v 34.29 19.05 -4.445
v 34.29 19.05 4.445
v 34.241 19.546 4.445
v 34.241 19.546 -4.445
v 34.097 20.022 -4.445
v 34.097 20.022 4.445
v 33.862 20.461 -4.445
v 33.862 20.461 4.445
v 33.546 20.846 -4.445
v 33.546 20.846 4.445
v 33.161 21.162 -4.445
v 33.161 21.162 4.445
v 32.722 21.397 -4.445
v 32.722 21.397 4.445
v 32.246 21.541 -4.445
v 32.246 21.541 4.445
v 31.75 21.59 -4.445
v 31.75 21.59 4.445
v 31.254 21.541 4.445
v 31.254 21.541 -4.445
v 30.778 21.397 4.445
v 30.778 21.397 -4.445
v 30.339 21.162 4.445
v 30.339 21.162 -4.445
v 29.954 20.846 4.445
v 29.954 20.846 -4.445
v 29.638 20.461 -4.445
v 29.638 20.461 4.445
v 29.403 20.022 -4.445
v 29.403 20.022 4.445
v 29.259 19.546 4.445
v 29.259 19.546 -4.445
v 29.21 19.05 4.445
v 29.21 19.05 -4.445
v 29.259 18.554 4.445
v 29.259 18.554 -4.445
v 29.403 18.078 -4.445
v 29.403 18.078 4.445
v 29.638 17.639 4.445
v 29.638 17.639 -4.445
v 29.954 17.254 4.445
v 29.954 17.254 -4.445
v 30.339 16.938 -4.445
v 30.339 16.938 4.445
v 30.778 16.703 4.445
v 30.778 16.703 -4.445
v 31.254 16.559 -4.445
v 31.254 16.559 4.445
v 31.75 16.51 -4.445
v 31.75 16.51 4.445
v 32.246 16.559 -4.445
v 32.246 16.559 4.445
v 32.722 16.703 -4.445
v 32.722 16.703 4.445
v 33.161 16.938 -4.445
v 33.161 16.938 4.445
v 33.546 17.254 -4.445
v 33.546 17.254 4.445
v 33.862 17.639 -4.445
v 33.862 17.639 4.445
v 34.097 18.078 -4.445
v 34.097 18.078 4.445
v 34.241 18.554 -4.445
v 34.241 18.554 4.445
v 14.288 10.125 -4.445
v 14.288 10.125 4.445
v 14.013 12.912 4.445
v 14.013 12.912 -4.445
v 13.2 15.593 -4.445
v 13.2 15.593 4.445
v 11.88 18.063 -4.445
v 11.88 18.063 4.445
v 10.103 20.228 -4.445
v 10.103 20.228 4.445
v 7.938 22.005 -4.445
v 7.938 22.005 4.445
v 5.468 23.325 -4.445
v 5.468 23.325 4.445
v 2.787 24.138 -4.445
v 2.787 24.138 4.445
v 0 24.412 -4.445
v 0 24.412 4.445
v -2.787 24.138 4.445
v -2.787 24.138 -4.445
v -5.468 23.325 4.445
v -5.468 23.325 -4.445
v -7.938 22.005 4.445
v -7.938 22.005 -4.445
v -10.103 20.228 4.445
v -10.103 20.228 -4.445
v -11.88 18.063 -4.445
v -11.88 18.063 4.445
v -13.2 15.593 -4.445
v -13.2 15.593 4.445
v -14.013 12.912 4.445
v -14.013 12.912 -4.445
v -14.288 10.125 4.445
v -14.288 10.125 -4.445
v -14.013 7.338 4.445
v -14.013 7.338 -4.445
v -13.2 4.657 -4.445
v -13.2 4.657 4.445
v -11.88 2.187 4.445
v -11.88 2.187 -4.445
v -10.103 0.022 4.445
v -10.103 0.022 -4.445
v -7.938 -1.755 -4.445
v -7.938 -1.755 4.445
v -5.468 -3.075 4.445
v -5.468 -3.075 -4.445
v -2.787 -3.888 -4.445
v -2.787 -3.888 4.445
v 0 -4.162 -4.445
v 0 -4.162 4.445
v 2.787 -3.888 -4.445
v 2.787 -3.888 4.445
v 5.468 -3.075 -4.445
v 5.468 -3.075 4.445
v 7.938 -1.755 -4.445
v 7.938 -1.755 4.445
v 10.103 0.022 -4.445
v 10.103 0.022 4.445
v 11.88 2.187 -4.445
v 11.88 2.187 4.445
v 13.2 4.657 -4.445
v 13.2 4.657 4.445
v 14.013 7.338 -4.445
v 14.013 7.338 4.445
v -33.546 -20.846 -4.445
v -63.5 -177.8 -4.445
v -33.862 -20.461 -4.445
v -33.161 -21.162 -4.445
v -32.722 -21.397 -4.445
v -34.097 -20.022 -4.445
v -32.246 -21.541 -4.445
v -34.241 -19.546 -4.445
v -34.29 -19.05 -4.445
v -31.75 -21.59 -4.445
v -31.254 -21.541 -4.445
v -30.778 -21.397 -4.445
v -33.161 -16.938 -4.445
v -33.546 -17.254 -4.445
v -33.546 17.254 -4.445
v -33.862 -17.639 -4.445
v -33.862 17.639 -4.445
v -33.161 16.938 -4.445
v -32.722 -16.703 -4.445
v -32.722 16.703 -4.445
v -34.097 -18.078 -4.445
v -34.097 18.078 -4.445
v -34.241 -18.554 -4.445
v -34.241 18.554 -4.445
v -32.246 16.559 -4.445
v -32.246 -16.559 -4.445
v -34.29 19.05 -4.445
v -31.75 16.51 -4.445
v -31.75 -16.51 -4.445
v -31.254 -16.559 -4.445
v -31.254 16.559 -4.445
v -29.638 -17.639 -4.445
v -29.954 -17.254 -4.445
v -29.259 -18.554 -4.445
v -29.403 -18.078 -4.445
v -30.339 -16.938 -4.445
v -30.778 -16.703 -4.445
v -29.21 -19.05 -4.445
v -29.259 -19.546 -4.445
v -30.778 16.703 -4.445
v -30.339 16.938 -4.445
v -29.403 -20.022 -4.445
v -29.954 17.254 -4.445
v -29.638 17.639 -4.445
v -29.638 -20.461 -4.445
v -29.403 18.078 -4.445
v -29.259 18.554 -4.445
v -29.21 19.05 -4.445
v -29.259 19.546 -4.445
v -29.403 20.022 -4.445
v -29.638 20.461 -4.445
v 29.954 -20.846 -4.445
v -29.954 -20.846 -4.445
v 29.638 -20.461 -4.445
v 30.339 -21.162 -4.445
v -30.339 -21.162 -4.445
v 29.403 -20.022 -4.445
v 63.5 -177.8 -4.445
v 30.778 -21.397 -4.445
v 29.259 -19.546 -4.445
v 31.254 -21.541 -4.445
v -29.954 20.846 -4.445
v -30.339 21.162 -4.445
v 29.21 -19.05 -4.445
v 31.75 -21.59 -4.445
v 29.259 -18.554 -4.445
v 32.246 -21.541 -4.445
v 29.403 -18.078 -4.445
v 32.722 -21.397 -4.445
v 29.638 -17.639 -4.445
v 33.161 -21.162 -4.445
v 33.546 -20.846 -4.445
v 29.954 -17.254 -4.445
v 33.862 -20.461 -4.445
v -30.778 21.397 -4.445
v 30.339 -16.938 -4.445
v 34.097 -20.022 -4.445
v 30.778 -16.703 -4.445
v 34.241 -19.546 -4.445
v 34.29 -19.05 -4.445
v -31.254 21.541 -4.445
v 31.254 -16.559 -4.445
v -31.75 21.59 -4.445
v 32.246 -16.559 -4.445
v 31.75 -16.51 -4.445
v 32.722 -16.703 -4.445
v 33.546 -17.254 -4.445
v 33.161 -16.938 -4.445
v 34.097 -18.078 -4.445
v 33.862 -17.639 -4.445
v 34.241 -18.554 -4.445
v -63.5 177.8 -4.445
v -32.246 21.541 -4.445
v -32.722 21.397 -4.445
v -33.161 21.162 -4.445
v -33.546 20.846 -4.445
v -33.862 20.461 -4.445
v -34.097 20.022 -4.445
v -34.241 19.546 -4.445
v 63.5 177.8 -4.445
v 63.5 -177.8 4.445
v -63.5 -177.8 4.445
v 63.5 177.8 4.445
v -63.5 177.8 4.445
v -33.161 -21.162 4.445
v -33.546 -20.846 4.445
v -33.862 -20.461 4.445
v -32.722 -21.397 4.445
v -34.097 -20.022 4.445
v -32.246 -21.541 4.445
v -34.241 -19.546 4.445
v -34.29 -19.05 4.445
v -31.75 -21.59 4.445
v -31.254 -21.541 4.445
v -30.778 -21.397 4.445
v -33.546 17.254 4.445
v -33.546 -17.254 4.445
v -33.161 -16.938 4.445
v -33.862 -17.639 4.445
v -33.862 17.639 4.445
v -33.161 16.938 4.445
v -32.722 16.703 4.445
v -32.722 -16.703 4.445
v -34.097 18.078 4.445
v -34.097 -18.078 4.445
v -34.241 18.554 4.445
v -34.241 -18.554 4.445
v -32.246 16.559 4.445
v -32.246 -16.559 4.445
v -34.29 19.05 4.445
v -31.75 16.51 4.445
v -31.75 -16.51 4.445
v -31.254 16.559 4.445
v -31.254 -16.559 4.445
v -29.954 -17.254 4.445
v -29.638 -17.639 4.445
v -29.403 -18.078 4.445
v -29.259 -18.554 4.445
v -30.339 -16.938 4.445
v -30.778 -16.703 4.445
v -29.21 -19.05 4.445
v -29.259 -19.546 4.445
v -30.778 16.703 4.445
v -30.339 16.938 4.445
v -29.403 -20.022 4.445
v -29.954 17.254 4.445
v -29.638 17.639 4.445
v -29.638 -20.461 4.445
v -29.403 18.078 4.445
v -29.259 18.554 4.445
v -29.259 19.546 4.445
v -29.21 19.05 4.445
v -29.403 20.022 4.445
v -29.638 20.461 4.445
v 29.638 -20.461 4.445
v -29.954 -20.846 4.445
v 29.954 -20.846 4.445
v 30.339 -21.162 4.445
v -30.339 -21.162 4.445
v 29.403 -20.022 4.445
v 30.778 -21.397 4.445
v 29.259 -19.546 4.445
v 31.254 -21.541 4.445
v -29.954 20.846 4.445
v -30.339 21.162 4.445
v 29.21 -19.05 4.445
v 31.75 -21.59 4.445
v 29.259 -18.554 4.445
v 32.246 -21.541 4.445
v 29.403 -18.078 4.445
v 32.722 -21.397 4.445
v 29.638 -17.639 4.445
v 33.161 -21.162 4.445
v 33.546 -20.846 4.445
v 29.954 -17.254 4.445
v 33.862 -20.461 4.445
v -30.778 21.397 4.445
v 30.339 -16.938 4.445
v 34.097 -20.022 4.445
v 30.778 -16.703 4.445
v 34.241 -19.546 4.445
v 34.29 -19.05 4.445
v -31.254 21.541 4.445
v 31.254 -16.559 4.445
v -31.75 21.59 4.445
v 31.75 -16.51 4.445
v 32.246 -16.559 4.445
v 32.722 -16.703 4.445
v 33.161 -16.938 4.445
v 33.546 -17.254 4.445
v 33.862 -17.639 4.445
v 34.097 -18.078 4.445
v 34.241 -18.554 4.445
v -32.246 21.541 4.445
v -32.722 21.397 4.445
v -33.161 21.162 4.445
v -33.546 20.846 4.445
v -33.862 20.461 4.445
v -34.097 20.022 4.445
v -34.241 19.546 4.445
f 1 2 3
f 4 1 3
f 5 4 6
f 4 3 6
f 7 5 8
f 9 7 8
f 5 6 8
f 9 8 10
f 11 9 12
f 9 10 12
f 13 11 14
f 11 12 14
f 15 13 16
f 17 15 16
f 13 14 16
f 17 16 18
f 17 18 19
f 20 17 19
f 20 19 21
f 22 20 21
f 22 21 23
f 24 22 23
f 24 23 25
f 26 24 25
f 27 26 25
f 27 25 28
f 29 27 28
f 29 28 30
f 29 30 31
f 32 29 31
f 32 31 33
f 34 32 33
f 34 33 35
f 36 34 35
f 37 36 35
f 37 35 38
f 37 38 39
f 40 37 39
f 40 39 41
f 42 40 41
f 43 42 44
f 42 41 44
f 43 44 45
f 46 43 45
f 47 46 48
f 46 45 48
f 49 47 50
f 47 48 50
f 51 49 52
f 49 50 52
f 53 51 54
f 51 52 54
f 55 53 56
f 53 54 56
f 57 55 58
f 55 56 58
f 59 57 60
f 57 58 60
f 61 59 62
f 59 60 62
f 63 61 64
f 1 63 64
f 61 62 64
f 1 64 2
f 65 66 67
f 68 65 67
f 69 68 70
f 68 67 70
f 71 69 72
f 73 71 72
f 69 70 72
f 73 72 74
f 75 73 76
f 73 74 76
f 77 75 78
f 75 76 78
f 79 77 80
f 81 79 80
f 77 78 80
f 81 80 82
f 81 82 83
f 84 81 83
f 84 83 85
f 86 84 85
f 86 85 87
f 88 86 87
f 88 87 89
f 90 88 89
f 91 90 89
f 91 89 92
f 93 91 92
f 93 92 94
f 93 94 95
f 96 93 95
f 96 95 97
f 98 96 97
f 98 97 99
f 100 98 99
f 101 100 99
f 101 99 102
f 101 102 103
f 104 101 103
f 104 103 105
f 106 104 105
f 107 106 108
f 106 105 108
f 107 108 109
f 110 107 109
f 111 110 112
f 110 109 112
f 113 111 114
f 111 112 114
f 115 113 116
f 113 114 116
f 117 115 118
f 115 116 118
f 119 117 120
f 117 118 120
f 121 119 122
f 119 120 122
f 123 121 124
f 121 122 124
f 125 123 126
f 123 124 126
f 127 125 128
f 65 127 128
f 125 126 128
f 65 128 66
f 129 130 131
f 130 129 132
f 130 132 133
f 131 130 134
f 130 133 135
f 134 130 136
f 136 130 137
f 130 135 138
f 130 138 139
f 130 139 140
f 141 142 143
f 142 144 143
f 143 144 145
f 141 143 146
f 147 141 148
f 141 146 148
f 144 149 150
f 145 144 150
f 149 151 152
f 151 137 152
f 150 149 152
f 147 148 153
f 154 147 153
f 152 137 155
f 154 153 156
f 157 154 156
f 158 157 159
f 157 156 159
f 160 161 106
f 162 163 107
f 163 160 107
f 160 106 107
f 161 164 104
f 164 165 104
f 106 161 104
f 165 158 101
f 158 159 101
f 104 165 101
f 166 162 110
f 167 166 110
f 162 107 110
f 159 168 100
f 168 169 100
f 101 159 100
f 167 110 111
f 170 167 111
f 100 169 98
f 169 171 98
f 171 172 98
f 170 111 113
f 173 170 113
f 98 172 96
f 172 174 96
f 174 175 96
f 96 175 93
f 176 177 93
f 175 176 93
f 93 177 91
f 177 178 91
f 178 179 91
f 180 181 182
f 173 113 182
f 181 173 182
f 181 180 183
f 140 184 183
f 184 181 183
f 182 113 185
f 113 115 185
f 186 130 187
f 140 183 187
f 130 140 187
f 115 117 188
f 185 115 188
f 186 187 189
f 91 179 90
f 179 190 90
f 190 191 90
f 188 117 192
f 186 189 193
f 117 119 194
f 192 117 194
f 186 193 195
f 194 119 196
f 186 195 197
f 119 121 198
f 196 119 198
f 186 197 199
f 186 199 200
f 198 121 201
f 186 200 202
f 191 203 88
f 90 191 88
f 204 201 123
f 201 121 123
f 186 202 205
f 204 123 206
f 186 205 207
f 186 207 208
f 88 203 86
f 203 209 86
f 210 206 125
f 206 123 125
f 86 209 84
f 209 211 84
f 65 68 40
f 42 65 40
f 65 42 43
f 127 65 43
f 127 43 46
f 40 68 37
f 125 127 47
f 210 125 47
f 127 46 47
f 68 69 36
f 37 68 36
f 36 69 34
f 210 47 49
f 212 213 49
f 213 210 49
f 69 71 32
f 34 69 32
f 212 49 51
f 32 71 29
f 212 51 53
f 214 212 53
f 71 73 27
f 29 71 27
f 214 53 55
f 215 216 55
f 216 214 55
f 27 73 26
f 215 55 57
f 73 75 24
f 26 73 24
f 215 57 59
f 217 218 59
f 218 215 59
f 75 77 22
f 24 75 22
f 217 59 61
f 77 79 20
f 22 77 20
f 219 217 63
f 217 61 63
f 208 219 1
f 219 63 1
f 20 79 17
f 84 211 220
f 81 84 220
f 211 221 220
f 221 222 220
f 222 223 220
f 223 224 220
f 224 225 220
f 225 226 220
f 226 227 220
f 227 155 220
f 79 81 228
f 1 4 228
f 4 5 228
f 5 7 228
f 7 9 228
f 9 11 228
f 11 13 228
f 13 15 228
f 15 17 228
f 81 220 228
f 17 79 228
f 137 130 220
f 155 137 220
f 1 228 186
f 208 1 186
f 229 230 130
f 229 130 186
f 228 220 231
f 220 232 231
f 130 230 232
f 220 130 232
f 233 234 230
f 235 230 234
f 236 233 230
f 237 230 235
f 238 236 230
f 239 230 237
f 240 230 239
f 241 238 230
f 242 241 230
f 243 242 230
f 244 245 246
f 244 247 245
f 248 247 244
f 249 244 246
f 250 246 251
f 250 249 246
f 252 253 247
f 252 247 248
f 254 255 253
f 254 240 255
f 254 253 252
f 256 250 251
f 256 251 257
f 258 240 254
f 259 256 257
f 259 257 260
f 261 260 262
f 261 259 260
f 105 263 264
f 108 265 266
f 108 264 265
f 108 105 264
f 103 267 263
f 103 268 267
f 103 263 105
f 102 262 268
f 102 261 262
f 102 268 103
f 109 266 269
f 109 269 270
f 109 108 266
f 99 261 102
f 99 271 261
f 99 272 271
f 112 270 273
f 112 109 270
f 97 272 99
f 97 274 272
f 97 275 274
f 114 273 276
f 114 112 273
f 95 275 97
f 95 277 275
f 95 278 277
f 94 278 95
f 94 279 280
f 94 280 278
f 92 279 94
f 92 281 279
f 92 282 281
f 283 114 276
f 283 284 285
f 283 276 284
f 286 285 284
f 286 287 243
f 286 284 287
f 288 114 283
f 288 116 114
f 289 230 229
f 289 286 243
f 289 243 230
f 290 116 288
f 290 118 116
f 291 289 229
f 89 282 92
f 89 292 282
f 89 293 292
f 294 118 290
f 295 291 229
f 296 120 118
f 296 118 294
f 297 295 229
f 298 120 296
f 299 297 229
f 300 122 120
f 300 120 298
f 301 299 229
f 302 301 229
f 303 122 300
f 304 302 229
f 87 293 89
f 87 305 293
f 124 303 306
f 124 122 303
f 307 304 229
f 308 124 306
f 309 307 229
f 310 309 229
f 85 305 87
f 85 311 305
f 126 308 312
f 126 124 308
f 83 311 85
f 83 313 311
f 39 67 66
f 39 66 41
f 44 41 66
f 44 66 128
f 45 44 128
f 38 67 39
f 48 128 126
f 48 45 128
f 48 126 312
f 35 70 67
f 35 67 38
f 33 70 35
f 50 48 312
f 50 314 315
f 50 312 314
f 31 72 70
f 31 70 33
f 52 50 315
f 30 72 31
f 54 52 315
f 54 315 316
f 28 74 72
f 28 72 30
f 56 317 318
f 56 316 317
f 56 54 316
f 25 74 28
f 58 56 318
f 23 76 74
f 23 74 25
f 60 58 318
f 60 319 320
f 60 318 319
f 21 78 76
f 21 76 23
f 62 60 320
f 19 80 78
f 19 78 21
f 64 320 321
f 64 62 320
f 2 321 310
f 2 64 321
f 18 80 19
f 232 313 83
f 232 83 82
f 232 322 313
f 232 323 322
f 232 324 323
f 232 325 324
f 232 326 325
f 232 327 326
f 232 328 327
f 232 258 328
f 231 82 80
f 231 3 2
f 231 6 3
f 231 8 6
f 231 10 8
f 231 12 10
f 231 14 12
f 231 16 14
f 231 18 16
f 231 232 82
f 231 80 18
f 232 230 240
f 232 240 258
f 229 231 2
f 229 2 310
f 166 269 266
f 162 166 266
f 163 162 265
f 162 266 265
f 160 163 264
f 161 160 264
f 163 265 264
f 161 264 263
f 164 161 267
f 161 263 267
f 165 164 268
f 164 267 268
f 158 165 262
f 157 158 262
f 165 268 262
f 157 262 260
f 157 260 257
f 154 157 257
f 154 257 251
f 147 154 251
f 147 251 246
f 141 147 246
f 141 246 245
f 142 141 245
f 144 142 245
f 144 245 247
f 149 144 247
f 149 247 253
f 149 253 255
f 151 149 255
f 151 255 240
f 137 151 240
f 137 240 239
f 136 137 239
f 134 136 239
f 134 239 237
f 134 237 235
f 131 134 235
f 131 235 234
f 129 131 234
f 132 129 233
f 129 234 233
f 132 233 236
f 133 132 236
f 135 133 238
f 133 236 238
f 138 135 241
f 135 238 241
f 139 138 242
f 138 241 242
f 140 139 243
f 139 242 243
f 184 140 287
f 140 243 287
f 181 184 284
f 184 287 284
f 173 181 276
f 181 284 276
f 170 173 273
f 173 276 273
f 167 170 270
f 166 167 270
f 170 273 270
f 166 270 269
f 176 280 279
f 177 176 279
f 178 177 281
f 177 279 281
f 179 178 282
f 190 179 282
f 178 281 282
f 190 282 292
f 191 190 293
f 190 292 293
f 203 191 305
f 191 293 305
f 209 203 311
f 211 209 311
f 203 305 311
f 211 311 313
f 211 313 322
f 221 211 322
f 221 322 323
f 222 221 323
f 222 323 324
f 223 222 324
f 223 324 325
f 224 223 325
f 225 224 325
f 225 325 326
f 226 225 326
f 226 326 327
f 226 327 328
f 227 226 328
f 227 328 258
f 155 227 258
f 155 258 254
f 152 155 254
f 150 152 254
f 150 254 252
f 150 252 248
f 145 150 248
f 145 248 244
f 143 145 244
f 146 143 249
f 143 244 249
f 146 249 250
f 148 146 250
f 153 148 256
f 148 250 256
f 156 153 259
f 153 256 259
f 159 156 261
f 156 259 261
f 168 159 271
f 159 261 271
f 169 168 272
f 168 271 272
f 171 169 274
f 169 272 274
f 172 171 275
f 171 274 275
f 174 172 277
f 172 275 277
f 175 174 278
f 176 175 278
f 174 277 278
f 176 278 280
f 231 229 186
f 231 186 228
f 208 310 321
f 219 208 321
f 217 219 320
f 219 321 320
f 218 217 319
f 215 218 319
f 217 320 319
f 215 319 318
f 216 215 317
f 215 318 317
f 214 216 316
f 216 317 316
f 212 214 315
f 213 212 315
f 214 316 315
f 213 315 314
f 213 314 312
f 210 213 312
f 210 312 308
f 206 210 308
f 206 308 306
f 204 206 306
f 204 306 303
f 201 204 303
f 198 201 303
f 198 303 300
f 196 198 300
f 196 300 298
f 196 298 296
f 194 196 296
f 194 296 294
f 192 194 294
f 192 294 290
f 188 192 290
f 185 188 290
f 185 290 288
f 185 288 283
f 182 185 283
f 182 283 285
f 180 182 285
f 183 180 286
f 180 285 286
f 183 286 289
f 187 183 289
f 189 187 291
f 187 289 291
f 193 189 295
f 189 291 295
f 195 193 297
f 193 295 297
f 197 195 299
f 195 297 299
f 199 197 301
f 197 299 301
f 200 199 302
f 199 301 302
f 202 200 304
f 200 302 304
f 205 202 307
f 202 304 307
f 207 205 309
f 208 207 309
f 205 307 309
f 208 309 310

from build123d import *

# Parameters (mm, degrees)
SKETCH1_W           = 127
SKETCH1_H           = 355.6
BOSS_EXTRUDE1_DEPTH = 4.445
SKETCH2_R           = 14.2875
SKETCH2_R_2         = 2.54
CUT_EXTRUDE1_DEPTH  = 190.008259343


with BuildPart() as part:
    # Sketch1 → Boss-Extrude1 (new, symmetric)
    with BuildSketch(Plane.XY):
        Rectangle(SKETCH1_W, SKETCH1_H)
    extrude(amount=BOSS_EXTRUDE1_DEPTH, both=True)

    # Sketch2 → Cut-Extrude1 (cut, through all)
    with BuildSketch(Plane.XY.offset(4.445)):
        with Locations((0, 10.125)):
            Circle(SKETCH2_R)
        with Locations((31.75, 19.05)):
            Circle(SKETCH2_R_2)
        with Locations((31.75, -19.05)):
            Circle(SKETCH2_R_2)
        with Locations((-31.75, -19.05)):
            Circle(SKETCH2_R_2)
        with Locations((-31.75, 19.05)):
            Circle(SKETCH2_R_2)
    extrude(amount=-CUT_EXTRUDE1_DEPTH, mode=Mode.SUBTRACT)


solid = part.part
